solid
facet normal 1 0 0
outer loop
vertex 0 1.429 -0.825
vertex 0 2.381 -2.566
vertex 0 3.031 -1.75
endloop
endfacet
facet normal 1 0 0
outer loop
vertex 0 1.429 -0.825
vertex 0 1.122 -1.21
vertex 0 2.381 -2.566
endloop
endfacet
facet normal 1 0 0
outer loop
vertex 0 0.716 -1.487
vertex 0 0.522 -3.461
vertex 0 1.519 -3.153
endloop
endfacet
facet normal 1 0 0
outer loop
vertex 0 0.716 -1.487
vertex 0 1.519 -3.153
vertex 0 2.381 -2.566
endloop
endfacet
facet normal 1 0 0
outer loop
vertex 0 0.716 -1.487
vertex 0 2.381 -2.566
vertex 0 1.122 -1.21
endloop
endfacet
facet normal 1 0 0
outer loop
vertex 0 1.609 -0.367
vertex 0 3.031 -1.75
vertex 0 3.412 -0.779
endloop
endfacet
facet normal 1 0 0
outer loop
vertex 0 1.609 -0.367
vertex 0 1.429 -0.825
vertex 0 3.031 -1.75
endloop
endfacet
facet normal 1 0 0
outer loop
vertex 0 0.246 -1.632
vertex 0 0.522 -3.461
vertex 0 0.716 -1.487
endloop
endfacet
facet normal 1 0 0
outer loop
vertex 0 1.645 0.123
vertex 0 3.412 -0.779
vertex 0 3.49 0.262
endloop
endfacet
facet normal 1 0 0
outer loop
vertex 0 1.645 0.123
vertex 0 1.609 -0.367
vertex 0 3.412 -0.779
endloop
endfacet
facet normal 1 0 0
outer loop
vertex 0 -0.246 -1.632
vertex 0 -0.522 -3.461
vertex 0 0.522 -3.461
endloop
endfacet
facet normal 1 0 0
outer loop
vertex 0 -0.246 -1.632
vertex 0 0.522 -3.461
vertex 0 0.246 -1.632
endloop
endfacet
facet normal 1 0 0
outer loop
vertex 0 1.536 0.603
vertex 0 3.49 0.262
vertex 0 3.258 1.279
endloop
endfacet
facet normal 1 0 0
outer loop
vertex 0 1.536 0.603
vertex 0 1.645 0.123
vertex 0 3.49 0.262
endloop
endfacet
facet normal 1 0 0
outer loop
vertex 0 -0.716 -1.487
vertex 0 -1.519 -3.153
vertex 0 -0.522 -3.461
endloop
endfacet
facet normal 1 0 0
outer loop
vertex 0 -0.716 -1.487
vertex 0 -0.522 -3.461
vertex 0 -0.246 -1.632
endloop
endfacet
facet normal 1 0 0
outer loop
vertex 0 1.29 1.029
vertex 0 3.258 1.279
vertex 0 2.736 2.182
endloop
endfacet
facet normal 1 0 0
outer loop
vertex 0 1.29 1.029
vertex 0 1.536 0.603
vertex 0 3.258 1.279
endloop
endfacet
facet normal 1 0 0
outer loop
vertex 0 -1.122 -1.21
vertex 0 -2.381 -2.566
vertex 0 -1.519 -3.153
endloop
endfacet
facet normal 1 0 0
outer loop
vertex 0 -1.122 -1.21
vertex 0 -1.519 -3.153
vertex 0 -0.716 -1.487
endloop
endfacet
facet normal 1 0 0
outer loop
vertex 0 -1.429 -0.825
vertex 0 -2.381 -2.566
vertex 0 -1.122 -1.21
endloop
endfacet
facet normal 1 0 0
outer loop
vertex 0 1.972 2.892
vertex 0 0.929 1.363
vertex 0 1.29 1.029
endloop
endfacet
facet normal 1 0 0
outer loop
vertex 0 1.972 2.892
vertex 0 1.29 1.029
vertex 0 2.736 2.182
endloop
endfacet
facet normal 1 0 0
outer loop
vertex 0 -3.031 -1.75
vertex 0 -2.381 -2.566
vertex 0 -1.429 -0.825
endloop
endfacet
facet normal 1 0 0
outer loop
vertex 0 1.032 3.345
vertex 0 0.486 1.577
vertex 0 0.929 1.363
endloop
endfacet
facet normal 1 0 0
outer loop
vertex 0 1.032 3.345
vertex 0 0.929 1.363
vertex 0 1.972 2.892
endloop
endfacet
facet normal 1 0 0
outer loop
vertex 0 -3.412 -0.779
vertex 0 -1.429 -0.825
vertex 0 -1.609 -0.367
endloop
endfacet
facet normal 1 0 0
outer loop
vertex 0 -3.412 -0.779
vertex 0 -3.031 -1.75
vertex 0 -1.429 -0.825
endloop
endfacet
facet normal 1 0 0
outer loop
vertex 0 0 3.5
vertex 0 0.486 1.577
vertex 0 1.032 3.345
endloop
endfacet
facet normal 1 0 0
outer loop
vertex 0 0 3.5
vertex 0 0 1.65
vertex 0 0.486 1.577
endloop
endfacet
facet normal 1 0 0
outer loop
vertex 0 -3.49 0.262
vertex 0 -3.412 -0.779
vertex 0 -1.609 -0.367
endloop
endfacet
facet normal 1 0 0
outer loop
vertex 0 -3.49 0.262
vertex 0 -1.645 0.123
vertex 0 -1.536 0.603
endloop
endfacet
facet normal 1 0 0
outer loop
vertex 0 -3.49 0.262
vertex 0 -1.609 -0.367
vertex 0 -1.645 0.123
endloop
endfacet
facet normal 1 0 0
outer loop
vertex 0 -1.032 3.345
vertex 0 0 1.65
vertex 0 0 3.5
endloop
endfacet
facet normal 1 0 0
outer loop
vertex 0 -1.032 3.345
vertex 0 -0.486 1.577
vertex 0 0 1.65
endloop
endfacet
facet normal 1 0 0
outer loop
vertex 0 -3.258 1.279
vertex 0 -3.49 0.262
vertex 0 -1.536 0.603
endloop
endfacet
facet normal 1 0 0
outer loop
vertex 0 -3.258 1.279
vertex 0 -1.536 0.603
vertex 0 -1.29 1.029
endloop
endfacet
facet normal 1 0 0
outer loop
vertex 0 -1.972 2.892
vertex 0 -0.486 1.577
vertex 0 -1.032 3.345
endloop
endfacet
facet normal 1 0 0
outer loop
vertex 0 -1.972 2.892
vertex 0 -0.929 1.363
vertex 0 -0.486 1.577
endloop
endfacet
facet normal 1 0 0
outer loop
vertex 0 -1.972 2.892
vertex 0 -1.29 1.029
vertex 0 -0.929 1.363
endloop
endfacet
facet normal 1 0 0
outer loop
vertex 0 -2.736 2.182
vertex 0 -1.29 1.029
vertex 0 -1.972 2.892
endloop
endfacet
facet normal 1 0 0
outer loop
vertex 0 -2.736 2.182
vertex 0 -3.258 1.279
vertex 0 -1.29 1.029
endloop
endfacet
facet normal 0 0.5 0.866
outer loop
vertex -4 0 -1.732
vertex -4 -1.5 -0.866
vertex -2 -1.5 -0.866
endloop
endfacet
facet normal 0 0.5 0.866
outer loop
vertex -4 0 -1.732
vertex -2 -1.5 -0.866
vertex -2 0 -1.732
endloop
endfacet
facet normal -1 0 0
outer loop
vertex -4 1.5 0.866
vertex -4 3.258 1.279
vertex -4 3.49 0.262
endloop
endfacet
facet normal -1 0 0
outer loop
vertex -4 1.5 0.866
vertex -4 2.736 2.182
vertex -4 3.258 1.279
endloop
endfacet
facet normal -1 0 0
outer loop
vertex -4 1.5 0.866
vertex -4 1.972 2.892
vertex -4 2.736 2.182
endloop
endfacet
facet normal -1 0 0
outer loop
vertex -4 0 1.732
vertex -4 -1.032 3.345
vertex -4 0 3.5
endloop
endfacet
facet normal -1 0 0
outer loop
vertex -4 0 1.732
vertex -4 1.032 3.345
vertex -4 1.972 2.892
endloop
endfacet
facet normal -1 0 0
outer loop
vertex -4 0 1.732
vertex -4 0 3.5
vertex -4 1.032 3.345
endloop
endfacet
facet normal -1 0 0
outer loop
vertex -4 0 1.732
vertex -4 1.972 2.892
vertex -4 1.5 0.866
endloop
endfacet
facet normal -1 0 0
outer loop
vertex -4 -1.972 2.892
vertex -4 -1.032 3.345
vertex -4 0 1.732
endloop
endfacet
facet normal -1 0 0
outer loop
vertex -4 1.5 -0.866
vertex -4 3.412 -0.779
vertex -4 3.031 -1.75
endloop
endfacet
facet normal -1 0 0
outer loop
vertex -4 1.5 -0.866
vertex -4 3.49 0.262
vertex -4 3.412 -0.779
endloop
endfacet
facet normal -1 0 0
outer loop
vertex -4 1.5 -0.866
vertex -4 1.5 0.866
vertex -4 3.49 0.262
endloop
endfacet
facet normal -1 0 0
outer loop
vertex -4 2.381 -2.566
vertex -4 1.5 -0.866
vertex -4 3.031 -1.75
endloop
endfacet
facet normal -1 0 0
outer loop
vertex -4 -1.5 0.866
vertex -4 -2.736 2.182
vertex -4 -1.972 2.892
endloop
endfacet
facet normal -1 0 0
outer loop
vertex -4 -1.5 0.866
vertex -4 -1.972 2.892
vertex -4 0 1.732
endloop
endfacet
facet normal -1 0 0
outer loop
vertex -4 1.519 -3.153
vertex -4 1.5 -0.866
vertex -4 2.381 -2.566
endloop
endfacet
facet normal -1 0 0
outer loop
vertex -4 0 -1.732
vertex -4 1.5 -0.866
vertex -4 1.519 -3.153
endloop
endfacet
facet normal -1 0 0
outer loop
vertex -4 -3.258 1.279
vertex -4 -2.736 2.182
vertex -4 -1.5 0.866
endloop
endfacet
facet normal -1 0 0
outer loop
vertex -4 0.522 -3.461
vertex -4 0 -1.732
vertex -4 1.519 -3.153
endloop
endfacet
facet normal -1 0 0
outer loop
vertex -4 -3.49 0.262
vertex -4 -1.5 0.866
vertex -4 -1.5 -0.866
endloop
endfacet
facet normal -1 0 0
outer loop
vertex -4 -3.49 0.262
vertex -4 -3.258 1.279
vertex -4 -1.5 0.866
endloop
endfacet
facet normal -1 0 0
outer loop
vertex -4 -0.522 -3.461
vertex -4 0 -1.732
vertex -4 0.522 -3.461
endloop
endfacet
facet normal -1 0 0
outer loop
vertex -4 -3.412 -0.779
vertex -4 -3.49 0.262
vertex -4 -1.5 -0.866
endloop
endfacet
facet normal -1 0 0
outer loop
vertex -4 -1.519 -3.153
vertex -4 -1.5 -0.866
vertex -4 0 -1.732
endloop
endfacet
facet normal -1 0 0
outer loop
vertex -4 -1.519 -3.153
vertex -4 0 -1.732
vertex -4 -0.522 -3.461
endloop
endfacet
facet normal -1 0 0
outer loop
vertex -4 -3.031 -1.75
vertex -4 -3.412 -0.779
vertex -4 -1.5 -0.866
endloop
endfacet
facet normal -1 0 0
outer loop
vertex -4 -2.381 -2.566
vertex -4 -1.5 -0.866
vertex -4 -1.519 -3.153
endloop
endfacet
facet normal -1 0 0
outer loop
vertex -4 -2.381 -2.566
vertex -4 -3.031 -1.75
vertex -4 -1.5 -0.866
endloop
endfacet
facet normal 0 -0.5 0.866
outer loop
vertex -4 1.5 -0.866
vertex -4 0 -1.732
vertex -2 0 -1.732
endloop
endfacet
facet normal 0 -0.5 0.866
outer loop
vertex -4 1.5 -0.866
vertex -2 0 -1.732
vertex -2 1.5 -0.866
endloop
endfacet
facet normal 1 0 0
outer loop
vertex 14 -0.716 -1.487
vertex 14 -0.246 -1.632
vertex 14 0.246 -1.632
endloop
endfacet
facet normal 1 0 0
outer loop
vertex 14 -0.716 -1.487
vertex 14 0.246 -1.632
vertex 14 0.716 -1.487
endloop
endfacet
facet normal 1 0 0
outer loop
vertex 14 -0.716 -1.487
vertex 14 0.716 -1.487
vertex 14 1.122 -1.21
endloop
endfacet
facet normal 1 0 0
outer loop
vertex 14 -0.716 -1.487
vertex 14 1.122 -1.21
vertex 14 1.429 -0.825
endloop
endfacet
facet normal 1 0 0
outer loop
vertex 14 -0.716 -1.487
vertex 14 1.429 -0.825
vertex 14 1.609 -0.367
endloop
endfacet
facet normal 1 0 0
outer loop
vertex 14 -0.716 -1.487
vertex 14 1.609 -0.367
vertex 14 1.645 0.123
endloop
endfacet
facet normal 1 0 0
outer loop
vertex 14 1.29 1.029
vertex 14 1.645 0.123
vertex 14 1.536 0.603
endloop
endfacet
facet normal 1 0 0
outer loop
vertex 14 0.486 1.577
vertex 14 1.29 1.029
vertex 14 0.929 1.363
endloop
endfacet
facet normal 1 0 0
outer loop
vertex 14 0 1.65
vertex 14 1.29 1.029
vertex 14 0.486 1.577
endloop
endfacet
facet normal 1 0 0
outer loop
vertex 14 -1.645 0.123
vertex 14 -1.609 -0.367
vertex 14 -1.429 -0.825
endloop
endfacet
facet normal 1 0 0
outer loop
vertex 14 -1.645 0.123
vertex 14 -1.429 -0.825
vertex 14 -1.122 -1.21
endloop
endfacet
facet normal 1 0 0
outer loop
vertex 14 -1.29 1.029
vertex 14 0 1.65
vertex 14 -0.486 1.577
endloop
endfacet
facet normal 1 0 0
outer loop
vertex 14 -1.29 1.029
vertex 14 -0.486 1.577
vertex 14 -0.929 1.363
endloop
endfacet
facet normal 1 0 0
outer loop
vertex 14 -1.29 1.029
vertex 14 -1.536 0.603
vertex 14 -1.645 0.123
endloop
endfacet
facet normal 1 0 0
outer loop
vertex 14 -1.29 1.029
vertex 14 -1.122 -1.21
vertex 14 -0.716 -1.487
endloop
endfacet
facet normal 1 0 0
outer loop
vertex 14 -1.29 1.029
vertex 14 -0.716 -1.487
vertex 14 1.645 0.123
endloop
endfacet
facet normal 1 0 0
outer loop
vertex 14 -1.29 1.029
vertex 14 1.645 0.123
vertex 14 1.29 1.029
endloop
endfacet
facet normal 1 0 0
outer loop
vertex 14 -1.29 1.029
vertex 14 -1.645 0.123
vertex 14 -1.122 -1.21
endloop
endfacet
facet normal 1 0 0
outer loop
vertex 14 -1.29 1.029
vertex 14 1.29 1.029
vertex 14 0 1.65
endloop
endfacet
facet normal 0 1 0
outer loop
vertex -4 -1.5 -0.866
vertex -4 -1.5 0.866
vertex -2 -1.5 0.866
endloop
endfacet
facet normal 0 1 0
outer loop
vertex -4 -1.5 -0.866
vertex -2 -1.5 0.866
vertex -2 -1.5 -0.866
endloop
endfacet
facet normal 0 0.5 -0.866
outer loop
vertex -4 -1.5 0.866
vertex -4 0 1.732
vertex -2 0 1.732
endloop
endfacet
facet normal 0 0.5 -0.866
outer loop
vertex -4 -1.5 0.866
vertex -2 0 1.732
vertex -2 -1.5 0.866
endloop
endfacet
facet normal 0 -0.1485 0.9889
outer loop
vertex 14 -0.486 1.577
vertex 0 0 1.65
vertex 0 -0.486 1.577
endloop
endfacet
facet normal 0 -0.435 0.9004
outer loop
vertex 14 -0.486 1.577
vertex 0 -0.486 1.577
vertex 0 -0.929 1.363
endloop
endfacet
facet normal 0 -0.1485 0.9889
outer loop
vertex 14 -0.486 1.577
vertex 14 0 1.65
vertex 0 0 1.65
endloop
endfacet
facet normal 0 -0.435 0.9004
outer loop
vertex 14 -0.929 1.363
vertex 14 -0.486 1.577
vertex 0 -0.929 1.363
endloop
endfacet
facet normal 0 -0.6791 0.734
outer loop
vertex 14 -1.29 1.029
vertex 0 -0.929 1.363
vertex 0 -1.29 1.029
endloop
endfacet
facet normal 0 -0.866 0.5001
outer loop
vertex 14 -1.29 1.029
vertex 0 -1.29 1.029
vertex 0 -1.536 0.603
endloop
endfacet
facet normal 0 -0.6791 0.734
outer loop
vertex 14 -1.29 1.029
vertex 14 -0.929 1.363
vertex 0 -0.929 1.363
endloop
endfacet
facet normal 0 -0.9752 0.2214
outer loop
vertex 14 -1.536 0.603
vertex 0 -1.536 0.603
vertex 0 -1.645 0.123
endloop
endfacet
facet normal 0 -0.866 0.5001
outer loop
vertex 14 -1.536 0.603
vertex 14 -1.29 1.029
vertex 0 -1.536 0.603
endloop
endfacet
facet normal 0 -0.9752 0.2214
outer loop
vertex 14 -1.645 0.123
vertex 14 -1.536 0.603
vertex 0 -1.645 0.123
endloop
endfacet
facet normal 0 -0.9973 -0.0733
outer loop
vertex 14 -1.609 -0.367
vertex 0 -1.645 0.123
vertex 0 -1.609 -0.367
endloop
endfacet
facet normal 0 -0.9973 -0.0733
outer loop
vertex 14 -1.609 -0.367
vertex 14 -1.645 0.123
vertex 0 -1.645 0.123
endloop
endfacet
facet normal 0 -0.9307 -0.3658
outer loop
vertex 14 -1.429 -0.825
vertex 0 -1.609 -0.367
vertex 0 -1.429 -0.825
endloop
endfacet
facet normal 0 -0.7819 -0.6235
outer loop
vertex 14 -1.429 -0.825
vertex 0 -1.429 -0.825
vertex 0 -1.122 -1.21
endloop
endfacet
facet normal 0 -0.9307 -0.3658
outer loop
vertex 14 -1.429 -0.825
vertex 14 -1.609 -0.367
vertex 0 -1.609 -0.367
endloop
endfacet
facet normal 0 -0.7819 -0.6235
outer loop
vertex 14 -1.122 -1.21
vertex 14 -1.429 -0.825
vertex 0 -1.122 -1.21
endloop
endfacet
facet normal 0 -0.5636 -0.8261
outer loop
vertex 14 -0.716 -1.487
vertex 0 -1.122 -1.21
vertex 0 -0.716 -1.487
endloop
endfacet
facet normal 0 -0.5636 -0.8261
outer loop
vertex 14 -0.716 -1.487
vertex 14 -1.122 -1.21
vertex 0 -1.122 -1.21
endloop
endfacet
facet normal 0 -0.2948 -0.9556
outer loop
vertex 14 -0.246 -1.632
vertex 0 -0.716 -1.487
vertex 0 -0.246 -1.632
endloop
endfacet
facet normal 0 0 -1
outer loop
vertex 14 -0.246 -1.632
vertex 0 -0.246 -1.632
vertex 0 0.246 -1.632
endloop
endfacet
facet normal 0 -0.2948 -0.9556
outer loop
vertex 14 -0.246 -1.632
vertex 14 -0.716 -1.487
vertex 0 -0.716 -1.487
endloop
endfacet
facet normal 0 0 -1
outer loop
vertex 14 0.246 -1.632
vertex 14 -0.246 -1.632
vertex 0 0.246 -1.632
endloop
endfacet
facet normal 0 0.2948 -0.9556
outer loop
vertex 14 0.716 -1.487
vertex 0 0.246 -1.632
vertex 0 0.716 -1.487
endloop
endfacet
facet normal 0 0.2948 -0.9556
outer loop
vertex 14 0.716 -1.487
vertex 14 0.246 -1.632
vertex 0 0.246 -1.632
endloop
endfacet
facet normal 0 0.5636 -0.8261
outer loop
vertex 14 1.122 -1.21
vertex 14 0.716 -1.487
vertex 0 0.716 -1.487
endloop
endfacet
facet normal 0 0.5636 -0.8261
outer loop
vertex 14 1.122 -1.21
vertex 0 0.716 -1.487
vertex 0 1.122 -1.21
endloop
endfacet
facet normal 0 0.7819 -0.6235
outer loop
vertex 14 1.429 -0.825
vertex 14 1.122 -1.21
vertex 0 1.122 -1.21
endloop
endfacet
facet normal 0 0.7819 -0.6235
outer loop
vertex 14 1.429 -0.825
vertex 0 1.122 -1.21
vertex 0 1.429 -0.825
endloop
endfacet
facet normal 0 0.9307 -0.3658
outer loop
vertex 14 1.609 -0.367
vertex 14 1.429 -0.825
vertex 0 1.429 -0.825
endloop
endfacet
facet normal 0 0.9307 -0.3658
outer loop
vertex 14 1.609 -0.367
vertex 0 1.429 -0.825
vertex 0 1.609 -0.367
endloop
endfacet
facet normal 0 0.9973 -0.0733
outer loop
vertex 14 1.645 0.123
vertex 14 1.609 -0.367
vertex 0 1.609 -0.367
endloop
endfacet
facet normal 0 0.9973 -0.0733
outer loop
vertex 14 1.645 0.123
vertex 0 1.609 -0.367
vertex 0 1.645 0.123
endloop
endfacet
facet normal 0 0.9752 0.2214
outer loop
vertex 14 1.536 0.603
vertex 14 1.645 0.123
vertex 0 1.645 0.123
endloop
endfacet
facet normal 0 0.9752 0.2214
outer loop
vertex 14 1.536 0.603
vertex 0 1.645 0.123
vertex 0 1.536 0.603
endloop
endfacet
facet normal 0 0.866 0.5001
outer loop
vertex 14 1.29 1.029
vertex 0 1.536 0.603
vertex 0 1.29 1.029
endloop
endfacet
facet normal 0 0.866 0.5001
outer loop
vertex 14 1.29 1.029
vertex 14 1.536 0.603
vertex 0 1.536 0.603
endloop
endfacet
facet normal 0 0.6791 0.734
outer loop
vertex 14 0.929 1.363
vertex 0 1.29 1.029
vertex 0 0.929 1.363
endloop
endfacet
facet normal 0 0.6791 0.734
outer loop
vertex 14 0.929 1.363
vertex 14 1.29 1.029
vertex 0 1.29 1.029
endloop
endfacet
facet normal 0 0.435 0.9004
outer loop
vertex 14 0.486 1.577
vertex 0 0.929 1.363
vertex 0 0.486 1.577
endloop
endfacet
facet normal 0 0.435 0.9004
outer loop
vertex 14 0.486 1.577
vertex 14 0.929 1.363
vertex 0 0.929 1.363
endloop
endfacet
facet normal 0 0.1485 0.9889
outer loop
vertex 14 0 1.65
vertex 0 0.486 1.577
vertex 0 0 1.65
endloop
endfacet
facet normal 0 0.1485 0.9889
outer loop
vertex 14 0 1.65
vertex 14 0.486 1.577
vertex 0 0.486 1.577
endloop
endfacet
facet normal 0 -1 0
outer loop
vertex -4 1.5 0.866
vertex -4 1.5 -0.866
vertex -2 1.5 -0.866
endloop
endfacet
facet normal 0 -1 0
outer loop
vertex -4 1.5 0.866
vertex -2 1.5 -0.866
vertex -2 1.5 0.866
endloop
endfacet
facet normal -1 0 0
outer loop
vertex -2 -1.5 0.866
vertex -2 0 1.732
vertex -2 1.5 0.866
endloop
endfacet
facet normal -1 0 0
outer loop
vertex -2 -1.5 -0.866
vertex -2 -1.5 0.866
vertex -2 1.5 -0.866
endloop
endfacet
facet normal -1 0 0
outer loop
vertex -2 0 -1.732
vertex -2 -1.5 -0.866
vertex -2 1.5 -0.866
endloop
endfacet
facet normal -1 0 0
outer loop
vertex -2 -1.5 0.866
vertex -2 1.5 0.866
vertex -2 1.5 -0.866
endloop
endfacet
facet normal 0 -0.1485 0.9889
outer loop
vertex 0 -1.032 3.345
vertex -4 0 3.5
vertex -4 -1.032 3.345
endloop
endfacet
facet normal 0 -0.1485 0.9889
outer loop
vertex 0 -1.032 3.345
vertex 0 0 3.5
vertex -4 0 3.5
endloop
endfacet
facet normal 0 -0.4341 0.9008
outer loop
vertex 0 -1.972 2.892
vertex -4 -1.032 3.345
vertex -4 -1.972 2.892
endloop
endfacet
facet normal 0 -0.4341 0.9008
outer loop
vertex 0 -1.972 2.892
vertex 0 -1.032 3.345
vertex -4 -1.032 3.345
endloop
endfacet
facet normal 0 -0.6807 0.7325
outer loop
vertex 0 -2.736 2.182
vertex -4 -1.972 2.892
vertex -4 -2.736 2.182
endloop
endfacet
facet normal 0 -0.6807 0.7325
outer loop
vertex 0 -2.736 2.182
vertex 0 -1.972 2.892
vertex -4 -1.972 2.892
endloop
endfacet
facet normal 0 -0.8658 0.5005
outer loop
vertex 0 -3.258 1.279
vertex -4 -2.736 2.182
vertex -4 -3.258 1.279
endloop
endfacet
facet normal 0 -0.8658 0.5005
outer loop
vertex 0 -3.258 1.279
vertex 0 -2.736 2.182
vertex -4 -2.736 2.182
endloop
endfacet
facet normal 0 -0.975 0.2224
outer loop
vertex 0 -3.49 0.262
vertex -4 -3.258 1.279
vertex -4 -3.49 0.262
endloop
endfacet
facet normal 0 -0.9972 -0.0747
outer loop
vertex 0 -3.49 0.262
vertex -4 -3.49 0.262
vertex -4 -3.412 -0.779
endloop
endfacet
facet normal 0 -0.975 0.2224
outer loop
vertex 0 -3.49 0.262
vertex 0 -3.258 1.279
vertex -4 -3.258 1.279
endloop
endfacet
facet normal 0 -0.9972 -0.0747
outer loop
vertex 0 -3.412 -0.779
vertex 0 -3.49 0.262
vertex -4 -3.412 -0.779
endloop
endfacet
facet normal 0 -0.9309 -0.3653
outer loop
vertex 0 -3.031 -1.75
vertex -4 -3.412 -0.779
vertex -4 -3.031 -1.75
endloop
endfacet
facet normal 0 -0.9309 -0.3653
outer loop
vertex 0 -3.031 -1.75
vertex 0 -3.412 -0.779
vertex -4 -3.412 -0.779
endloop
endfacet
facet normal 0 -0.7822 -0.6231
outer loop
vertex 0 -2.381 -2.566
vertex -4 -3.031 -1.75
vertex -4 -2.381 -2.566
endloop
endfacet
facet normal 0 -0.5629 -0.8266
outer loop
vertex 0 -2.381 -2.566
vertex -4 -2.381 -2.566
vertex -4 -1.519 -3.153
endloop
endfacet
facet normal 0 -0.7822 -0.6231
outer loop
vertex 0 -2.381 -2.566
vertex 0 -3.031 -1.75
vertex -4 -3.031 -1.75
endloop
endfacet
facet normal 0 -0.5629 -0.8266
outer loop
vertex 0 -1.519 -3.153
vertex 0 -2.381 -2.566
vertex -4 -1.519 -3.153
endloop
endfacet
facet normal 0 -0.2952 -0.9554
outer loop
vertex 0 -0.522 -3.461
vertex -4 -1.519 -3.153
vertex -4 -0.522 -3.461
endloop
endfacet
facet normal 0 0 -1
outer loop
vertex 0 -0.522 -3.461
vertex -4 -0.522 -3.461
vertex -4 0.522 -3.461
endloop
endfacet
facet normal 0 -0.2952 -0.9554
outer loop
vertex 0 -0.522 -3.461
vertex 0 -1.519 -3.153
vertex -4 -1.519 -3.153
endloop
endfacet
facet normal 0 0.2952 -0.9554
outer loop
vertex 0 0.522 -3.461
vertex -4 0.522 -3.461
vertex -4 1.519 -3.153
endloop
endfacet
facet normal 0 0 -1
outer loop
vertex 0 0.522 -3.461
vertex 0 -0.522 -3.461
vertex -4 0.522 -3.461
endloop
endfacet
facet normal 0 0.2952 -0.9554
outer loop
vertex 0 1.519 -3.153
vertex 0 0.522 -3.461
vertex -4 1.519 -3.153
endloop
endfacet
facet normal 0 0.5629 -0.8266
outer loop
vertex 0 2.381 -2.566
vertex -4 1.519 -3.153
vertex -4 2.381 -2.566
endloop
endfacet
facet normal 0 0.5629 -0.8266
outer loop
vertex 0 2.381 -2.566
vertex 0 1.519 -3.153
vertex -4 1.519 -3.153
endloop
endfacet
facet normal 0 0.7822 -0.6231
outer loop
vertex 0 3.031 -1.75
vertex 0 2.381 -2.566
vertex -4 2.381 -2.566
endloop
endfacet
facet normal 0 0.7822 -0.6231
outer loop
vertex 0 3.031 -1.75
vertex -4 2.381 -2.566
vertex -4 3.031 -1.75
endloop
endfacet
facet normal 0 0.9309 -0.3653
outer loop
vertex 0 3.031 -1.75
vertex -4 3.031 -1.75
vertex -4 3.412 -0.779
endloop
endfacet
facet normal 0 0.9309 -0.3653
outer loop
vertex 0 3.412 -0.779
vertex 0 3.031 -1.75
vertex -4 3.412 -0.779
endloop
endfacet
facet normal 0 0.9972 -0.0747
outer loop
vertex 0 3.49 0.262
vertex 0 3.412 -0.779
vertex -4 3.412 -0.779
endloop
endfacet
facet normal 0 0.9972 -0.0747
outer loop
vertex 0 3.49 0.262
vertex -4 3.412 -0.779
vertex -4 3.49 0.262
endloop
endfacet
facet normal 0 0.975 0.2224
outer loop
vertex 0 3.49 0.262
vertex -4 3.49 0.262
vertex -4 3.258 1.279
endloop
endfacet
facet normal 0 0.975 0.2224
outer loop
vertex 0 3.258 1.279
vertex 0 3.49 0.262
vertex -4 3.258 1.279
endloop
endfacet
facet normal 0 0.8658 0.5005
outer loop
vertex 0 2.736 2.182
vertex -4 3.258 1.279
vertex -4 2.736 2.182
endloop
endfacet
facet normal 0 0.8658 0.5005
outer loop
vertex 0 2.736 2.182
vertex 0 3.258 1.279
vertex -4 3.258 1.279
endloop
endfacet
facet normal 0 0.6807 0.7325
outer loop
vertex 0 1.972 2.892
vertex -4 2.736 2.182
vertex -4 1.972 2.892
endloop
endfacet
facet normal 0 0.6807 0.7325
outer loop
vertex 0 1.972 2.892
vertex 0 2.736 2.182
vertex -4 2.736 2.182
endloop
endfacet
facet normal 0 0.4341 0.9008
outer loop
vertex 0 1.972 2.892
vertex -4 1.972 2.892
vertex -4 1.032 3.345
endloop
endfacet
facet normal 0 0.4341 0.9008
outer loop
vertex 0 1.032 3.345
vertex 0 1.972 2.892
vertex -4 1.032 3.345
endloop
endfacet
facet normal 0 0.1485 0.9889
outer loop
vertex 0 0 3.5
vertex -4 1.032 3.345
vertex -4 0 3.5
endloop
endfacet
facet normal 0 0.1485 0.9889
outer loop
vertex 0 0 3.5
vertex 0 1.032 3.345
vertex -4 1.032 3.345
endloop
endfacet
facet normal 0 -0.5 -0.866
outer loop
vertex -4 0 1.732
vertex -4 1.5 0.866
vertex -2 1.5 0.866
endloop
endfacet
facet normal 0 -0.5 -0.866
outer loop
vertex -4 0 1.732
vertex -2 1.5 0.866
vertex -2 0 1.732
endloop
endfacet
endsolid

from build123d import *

# Parameters (mm, degrees)
SOCKET_DEPTH = 2


with BuildPart() as part:
    # Screw Sketch → Screw (revolve)
    with BuildSketch(Plane.XY):
        Polygon((-4, 0), (-4, 3.5), (0, 3.5), (0, 1.65), (14, 1.65), (14, 0), align=None)
    revolve(axis=Axis((-1000, 0, 0), (1, 0, 0)))

    # Socket Sketch → Socket (cut)
    with BuildSketch(Plane(origin=(-4, 0, 0), x_dir=(0, 0, -1), z_dir=(1, 0, 0))):
        Polygon((1.732050808, 0), (0.866025404, 1.5), (-0.866025404, 1.5), (-1.732050808, 0), (-0.866025404, -1.5), (0.866025404, -1.5), align=None)
    extrude(amount=SOCKET_DEPTH, mode=Mode.SUBTRACT)


solid = part.part
